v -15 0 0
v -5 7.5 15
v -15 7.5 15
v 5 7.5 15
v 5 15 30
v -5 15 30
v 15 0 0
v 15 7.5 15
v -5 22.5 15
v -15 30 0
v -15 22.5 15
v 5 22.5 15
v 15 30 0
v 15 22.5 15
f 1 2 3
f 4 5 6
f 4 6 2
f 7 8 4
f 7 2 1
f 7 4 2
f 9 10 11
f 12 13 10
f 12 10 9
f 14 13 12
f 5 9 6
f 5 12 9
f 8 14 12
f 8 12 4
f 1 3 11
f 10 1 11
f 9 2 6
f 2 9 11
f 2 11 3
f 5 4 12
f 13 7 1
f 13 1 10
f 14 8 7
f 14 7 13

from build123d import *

# Parameters (mm, degrees)
F1_DEPTH = 15
F2_DEPTH = 5


with BuildPart() as f1:
    # F0 (on Right) → F1 (new body, symmetric)
    with BuildSketch(Plane.YZ):
        Polygon((7.5, 15), (0, 0), (30, 0), (22.5, 15), align=None)
    extrude(amount=F1_DEPTH, both=True)

    # F0 (on Right) → F2 (join, symmetric)
    with BuildSketch(Plane.YZ):
        Polygon((15, 30), (7.5, 15), (22.5, 15), align=None)
    extrude(amount=F2_DEPTH, both=True)


solid = f1.part
